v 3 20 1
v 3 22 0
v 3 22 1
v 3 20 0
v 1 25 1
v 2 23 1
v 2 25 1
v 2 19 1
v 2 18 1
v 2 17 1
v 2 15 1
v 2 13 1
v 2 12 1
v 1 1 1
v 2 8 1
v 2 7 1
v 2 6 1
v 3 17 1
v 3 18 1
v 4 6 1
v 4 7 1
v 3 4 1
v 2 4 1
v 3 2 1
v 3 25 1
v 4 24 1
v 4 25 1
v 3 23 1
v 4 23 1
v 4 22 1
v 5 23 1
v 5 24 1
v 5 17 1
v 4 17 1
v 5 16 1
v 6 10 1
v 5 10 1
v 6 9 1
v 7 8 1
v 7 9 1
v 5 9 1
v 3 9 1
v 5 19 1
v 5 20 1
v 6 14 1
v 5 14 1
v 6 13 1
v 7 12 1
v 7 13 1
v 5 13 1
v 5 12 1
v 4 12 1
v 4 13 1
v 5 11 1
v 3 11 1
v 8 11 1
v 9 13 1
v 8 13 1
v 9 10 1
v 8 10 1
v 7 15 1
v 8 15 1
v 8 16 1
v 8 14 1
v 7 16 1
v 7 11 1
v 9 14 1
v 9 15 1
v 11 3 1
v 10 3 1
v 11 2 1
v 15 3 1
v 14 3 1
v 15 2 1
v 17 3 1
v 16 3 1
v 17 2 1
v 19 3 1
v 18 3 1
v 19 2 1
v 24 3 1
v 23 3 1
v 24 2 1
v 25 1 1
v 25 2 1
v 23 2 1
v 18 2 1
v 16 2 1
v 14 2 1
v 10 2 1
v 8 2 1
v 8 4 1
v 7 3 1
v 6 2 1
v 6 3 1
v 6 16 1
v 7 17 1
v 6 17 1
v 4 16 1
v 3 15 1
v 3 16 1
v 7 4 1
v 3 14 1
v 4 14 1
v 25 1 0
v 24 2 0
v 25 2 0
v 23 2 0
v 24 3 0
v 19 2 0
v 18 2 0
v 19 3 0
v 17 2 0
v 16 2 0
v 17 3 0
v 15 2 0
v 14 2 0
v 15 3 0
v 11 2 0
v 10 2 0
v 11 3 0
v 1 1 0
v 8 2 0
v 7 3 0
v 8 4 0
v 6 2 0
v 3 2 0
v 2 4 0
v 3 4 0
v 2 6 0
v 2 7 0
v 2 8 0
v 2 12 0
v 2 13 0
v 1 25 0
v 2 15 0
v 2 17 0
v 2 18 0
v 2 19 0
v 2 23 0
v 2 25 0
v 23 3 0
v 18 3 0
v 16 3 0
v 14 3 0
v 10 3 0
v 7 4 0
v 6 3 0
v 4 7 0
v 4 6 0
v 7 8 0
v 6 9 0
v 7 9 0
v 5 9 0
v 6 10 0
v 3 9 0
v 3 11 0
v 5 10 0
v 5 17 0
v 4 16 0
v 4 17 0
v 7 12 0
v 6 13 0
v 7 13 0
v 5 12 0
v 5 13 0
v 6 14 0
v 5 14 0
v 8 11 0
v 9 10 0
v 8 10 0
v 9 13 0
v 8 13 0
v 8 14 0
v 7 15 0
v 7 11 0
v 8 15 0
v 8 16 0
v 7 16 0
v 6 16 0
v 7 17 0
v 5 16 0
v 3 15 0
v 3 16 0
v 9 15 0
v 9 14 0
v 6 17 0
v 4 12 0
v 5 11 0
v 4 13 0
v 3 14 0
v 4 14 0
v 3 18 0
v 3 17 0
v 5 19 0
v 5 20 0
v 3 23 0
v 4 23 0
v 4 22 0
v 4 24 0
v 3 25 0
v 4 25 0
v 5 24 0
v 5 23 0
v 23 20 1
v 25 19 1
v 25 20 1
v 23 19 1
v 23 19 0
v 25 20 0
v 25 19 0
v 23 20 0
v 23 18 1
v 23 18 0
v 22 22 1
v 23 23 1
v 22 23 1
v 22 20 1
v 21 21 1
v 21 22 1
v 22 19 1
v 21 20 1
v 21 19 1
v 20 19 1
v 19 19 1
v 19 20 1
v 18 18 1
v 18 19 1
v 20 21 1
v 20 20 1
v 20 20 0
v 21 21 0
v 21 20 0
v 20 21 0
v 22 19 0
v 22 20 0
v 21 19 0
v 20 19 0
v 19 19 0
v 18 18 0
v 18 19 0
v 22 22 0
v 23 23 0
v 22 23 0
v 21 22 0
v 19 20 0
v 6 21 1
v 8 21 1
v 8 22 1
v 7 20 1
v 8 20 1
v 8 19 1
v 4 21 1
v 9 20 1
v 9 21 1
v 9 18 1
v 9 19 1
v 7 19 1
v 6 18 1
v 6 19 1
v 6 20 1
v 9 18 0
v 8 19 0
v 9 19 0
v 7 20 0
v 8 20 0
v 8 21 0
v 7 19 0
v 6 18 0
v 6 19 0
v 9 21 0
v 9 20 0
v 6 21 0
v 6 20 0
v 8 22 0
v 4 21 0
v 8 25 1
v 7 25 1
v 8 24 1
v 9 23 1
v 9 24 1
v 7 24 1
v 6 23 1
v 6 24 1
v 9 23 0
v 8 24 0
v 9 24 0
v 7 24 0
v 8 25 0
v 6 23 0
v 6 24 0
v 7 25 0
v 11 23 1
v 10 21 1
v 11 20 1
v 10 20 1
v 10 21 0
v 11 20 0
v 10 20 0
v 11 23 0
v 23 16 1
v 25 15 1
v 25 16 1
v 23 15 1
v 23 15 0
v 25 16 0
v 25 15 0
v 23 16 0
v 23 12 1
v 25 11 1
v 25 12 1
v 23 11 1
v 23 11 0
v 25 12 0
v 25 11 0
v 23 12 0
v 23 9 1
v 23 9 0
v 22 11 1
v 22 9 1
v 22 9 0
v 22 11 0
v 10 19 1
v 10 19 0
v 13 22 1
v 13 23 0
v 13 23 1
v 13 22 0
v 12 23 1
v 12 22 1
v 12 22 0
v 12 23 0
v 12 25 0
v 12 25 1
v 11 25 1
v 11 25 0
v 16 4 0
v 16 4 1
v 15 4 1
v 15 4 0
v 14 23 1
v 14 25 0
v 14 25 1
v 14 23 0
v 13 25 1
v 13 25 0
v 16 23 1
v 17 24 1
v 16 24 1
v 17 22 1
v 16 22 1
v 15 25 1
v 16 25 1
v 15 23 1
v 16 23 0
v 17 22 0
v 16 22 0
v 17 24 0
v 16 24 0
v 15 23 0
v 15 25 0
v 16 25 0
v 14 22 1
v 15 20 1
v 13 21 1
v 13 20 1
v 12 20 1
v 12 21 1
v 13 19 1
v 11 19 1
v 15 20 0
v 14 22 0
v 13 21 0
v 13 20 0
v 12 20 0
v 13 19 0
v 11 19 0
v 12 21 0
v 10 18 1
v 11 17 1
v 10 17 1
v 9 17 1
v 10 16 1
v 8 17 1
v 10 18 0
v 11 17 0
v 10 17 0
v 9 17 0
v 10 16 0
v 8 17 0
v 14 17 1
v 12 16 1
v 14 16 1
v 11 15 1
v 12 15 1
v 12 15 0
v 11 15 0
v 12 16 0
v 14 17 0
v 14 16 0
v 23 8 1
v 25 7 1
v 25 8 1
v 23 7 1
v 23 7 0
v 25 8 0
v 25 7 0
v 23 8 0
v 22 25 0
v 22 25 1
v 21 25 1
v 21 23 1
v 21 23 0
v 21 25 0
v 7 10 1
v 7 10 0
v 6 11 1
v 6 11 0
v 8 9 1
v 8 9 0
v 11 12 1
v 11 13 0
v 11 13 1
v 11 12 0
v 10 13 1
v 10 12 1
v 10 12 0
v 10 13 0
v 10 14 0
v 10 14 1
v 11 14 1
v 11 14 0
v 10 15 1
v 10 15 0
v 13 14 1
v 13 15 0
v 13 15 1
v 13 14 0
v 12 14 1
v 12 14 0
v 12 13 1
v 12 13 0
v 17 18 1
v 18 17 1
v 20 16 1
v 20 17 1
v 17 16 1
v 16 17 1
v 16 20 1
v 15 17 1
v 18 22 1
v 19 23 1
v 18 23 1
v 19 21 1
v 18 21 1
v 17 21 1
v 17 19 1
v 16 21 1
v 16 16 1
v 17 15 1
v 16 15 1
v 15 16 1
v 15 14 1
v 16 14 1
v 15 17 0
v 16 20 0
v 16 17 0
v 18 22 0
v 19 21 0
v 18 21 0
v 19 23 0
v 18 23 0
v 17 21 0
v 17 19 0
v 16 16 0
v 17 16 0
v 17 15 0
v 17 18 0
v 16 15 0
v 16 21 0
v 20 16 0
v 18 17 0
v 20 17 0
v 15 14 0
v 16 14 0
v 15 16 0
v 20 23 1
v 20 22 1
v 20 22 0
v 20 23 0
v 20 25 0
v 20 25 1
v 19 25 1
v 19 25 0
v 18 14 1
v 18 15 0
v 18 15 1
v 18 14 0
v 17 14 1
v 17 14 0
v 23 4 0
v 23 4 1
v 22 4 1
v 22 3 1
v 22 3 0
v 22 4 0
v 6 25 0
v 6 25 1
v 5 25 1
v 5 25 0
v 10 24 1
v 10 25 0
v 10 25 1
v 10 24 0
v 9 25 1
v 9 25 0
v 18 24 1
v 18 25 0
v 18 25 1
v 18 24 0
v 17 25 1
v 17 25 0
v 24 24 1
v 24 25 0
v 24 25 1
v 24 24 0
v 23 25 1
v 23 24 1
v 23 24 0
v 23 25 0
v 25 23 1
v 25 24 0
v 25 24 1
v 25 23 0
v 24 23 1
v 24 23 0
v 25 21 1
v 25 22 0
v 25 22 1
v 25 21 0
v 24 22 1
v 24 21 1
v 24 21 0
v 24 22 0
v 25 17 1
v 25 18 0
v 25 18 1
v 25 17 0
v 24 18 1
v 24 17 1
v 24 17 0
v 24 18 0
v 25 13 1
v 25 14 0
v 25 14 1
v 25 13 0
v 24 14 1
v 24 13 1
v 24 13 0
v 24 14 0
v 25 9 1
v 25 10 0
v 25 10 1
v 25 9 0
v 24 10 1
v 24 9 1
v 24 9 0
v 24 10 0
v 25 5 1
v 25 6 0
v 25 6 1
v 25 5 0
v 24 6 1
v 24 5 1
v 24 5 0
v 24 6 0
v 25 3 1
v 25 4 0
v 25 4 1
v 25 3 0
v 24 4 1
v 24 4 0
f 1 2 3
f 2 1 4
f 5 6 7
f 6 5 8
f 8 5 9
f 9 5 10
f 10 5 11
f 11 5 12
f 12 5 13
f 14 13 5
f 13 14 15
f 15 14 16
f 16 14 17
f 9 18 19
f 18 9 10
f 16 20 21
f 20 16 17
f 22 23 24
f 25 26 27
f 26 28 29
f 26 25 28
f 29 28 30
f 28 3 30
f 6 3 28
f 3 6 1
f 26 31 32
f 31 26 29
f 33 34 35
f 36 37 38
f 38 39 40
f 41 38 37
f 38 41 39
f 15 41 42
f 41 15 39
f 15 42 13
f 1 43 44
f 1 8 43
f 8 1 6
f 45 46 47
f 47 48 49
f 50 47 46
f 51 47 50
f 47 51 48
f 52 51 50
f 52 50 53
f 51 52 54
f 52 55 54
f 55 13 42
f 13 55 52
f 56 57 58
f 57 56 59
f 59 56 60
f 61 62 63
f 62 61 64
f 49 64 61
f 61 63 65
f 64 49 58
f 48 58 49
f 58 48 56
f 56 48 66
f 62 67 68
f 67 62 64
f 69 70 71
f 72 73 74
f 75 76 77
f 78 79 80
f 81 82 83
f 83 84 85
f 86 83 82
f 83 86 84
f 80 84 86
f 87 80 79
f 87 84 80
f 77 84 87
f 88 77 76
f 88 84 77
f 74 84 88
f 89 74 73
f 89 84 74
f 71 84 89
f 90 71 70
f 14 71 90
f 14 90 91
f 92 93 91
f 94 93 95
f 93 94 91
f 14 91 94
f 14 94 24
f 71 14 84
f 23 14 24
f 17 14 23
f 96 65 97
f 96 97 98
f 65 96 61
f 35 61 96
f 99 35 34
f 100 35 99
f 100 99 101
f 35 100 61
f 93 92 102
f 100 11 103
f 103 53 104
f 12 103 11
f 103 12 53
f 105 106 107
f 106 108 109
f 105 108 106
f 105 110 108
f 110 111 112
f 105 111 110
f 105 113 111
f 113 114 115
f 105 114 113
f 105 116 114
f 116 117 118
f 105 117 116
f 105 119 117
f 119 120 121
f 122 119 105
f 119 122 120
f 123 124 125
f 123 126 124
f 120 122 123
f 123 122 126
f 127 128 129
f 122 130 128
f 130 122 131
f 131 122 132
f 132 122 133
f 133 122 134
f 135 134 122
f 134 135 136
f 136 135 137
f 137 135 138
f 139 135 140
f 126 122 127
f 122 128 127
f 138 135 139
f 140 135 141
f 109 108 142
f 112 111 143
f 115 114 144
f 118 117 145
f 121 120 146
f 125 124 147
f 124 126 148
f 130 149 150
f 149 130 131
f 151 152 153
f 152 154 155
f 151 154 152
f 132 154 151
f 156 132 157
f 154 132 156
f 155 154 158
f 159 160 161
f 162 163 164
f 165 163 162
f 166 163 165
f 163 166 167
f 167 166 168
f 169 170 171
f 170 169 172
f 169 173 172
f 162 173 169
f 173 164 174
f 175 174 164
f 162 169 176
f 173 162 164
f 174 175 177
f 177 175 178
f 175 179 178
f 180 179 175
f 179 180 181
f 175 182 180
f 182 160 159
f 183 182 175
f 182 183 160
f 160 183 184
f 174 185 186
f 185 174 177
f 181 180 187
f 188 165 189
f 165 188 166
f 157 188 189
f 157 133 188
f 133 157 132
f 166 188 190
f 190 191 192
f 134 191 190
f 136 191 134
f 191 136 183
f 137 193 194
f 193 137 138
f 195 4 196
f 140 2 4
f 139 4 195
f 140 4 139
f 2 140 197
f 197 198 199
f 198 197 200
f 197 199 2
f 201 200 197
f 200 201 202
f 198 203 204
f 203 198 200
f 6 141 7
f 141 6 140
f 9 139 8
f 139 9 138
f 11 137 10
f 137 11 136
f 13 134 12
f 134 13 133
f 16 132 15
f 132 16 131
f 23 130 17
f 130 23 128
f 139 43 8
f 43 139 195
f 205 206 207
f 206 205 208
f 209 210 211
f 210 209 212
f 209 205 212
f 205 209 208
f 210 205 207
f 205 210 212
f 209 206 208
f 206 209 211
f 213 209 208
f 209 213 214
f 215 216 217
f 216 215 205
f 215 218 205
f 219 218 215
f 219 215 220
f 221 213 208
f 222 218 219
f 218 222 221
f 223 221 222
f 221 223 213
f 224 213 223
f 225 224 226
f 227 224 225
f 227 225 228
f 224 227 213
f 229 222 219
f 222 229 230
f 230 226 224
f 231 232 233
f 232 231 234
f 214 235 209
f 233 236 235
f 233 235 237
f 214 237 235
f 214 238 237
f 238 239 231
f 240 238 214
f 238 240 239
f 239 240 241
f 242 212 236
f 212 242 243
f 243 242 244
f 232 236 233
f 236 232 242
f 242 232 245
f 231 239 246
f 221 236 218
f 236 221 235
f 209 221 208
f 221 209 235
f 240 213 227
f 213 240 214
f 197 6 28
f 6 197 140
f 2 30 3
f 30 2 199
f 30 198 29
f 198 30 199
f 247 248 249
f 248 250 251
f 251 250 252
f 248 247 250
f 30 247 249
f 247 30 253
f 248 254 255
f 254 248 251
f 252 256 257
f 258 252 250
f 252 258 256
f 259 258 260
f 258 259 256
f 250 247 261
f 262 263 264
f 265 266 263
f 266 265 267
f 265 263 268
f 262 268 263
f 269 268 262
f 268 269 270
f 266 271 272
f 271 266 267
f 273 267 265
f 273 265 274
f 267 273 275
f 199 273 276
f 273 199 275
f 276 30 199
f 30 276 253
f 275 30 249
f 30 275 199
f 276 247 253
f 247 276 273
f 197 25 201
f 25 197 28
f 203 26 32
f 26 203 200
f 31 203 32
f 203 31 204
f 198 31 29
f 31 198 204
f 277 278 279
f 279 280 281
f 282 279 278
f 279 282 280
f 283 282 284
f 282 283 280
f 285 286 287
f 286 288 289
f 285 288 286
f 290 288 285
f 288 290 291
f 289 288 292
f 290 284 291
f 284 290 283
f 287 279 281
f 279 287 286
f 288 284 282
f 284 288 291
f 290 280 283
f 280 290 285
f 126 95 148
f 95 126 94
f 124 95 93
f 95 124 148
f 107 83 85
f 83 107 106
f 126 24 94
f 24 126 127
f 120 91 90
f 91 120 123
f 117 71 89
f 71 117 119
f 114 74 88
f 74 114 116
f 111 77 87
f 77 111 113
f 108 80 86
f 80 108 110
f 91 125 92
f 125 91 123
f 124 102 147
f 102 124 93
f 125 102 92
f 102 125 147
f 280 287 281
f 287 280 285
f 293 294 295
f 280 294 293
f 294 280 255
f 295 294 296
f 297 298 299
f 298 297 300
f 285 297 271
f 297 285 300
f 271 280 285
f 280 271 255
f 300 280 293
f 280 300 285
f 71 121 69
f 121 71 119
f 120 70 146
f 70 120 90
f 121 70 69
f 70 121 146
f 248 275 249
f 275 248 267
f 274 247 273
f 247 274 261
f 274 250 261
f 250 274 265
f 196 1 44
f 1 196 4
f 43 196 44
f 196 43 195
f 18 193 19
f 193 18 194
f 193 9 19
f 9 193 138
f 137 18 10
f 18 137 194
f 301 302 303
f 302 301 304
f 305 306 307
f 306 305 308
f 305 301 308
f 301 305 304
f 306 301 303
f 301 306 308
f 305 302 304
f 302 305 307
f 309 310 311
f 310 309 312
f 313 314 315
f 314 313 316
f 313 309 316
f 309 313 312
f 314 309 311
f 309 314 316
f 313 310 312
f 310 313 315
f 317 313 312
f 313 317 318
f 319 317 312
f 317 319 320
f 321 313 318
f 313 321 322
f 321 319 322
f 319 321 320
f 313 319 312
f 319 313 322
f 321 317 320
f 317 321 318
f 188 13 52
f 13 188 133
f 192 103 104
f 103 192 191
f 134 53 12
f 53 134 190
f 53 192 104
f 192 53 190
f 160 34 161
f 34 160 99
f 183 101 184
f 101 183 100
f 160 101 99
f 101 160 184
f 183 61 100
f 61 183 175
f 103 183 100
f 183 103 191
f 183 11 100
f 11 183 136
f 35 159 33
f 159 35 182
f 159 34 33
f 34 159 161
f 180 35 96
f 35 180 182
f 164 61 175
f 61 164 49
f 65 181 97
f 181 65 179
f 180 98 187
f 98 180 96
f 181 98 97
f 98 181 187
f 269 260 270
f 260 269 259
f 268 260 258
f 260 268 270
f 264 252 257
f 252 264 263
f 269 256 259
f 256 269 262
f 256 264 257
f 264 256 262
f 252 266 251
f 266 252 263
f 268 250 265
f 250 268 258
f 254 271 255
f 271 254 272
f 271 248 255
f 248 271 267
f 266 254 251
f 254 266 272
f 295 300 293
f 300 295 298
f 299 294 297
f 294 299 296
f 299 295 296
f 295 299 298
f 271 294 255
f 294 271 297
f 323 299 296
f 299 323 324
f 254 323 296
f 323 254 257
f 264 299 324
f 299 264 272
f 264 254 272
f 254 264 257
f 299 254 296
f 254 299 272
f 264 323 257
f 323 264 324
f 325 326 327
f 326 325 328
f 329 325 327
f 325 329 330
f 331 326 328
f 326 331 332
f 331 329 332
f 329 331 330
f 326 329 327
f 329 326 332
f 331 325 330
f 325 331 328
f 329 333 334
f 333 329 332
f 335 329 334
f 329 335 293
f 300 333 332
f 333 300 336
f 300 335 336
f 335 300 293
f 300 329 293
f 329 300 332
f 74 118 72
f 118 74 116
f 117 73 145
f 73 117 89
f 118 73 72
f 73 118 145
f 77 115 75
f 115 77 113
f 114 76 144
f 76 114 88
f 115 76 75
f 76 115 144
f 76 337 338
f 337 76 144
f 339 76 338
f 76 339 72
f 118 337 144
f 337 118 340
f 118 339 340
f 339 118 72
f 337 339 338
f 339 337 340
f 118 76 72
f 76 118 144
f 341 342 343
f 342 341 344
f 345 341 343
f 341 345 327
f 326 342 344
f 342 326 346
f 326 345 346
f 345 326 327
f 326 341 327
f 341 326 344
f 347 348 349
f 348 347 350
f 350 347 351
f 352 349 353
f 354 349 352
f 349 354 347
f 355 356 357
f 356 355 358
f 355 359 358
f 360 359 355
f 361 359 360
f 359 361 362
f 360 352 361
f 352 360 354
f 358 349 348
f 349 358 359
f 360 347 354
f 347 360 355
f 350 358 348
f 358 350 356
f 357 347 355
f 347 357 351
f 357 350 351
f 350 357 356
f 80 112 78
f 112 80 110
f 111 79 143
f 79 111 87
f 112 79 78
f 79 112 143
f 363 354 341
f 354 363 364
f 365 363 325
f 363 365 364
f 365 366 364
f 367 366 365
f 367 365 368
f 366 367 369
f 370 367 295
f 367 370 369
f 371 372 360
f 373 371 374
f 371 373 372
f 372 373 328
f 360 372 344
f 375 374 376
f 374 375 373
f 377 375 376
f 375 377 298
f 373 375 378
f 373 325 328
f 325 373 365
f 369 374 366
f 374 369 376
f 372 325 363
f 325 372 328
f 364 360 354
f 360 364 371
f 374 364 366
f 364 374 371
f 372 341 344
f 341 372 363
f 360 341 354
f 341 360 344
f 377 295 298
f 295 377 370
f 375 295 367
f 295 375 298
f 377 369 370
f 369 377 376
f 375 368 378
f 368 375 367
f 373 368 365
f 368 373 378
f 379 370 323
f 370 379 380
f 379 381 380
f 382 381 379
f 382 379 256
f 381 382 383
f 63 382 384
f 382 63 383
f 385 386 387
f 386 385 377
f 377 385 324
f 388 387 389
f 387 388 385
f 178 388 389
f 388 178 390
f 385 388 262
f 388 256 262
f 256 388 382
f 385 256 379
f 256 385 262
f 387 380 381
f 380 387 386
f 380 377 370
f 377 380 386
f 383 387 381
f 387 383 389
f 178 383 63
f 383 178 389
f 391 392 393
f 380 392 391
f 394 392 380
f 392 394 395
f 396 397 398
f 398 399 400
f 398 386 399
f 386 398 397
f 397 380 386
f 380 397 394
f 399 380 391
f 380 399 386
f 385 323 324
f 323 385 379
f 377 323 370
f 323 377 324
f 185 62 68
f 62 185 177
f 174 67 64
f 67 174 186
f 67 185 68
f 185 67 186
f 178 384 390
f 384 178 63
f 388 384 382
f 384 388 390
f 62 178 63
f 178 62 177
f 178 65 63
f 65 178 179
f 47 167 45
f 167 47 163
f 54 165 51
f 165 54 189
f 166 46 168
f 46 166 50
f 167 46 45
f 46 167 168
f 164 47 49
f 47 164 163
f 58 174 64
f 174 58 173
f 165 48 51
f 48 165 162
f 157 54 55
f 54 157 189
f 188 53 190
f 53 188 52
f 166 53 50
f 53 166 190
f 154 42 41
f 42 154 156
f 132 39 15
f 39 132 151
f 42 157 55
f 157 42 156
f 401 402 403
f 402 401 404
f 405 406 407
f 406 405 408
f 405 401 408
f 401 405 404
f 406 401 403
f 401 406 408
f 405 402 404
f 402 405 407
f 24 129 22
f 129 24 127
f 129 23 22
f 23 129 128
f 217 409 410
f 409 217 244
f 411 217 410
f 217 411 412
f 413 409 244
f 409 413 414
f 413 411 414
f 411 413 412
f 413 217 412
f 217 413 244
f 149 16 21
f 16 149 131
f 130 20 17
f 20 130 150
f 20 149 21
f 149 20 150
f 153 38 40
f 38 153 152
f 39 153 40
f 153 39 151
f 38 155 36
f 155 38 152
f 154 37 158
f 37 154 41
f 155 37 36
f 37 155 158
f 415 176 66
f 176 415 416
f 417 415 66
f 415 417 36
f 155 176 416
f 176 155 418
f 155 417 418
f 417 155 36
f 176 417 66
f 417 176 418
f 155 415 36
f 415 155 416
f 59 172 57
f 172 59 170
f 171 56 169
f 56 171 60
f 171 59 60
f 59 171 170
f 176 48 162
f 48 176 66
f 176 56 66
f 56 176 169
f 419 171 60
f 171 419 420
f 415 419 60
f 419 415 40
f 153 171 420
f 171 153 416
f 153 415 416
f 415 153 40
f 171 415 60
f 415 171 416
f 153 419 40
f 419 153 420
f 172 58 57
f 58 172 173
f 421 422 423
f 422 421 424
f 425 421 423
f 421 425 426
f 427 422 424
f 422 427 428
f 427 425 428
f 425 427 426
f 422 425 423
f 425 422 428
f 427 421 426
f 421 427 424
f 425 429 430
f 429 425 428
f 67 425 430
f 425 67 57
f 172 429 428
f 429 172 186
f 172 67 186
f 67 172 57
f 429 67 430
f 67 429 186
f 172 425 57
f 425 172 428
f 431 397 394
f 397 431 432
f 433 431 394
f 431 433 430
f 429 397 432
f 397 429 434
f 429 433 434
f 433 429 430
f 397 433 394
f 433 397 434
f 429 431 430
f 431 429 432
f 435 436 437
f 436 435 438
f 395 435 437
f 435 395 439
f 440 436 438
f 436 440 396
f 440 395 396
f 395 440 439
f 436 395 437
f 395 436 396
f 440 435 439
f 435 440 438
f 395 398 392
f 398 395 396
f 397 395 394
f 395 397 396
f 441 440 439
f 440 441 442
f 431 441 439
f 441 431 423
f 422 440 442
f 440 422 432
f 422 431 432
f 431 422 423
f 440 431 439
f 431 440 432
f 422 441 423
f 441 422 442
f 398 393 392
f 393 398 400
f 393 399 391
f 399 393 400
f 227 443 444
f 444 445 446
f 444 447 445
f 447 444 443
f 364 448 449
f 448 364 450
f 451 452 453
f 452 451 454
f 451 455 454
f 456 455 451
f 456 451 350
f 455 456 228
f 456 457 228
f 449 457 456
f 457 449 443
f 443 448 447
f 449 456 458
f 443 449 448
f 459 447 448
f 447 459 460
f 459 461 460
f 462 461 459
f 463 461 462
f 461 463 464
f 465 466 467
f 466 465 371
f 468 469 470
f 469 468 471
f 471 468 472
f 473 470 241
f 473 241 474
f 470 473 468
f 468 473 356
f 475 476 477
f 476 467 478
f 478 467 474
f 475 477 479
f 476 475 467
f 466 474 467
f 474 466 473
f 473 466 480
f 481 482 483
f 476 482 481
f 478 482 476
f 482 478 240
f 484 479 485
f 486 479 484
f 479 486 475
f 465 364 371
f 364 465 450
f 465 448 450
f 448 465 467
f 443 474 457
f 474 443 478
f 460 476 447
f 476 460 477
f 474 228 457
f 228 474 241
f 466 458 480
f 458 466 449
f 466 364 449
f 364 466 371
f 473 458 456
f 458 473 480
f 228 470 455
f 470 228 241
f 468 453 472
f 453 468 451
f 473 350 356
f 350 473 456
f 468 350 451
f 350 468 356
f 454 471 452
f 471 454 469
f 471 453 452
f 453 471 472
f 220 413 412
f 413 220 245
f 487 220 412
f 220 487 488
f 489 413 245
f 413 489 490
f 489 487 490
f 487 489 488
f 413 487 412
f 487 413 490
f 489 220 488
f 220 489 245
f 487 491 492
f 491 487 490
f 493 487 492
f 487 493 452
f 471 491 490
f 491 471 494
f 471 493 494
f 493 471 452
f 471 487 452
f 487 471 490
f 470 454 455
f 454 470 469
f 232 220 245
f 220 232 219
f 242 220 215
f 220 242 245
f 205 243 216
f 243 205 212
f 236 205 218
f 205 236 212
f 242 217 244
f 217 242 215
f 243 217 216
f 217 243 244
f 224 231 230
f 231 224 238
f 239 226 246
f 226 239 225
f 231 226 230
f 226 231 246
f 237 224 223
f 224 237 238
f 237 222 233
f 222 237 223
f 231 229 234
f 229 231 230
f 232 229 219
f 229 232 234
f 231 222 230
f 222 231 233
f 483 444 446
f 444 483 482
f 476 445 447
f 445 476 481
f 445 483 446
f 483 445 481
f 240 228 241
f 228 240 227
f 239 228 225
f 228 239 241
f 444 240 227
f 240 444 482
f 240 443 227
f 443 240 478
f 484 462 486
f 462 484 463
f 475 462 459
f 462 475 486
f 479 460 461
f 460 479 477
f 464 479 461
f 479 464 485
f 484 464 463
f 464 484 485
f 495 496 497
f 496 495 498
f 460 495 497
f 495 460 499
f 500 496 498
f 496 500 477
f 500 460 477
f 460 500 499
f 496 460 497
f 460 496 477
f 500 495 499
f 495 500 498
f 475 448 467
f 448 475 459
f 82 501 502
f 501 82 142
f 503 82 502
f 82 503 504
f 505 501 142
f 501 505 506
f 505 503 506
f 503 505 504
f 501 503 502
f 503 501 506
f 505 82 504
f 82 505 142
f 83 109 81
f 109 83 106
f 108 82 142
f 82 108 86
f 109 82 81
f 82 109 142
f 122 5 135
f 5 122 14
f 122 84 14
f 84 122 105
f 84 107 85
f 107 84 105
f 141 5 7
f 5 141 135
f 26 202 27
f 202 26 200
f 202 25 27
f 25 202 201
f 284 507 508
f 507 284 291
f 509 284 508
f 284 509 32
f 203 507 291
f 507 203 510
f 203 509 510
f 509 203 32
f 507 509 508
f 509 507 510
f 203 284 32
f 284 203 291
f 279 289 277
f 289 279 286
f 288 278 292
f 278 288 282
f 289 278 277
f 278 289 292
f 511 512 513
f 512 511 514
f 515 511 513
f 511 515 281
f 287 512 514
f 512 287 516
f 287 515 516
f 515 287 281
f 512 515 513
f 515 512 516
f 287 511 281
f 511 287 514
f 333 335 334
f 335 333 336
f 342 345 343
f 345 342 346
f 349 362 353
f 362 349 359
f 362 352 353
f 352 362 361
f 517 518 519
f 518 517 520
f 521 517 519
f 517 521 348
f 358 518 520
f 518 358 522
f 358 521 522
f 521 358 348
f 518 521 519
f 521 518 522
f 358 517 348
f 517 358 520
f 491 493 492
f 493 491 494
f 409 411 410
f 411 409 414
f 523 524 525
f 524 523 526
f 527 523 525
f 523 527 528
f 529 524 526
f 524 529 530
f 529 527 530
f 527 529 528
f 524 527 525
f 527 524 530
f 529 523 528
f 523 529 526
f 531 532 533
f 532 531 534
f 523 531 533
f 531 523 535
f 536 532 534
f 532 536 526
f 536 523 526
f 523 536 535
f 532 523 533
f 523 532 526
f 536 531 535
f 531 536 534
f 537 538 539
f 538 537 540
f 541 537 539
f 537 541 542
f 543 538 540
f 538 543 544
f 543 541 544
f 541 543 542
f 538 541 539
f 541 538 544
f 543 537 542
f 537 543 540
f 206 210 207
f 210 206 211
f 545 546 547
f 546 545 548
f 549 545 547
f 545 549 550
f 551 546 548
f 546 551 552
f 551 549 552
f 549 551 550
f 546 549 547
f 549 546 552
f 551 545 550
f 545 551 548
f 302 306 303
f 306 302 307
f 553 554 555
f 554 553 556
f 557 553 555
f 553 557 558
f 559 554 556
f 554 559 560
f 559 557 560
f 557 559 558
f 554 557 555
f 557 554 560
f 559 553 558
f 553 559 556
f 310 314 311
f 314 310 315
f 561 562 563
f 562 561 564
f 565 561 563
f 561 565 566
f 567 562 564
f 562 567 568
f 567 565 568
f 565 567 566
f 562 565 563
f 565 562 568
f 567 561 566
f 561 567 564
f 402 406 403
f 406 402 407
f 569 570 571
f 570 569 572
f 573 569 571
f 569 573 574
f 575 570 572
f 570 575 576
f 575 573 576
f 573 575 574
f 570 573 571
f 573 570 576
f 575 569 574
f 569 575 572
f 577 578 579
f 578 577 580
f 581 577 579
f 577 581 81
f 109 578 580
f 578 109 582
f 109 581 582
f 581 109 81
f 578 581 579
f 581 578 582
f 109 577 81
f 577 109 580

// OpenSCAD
// file: ../../util/bitmap.scad
/*****************************************************************************
 * Module Bitmap Library
 * Modules to create bitmaps of unit squares from 1 or 2 dimensional vectors.
 *****************************************************************************
 * Copyright 2017 Chris Baker
 *
 * This program is free software: you can redistribute it and/or modify
 * it under the terms of the GNU Lesser General Public License as published by
 * the Free Software Foundation, either version 3 of the License, or
 * (at your option) any later version.
 *
 * This program is distributed in the hope that it will be useful,
 * but WITHOUT ANY WARRANTY; without even the implied warranty of
 * MERCHANTABILITY or FITNESS FOR A PARTICULAR PURPOSE.  See the
 * GNU Lesser General Public License for more details.
 *
 * You should have received a copy of the GNU Lesser General Public License
 * along with this program.  If not, see <http://www.gnu.org/licenses/>.
 *****************************************************************************
 * Usage:
 * Include this file with the "use" tag.
 * Depends on compat.scad library.
 *
 * API:
 *   1dbitmap(bitmap, center, expansion, vector_mode)
 *   2dbitmap(bitmap, center, expansion, vector_mode)
 *     Generate a 1 or 2-Dimensional field of modules based on the provided
 *     bitmap vector. See Bitmap Vectors below.
 *     The center flag determines whether to center the bitmap on the origin.
 *     The expansion value actually shrinks each cube in the x and y
 *     dimension by the specified amount.
 *     The vector_mode flag determines whether to create 3D solid geometry
 *     (unit cubes) or 2D vector geometry (squares).
 *
 * Bitmap Vectors:
 *   The bitmap vectors primarily provide boolean information.
 *   A module will be placed where these vectors have a postive value and
 *   skipped where they have a negative value. I.E. 0, -1, false, and undef
 *   are all equivalent and result in a skip. 1 and true are equivalent and
 *   result in a placed 1-unit module.
 *   Further, if the value is an integer it will be treated as a height for
 *   the module, allowing z-maps to be created.
 *   If the value is not an integer or boolean, it will be treated as a color
 *   reference. This can be a string or RGBA vector that will be used to
 *   color the module in the OpenSCAD preview window.
 *   In current versions of OpenSCAD, the color has no effect in the rendered
 *   view or STL output.
 *
 * Vector Mode:
 *   Although OpenSCAD supports generating 2D geometry, there are several
 *   caveats:
 *   - 2D and 3D geometry cannot be mixed
 *   - Extruding 2D geometry causes color information to be lost
 *   - All 2D geometry is projected onto the XY plane when rendering
 *   - Rendering also results in loss of color (same as 3D)
 *   - The SVG exporter is somewhat limited:
 *     - The pixel size of the image is hard-coded in the file
 *     - The title of the image is a generic string
 *     - The color selection for stroke and fill is fixed
 *     - The stroke-width is set to a large value that will cause overlap
 *     - The background is transparent
 *     - Only one path element is created with all of the geometry; there is
 *       no easy way to split up the geometry into multiple logical units.
 *     - These issues can mostly be resolved by hand-editing the file:
 *       - Remove or modify the width and height parameters from the svg
 *         element at the top of the file to provide better scaling.
 *       - Edit the title element at the top of the file to change the title.
 *       - Edit the stroke and fill parameters of the path element (these will
 *         probably be at the end of the file).
 *       - Set the stroke-width parameter for the path element to 0.
 *****************************************************************************/
use <compat.scad>

/*
 * 2dbitmap - Turn a 2D vector into a bitmap of cubes
 *
 * bitmap - 2D vector representing where to place each cube
 *          Value can either be boolean, z-height, or color
 * center - center cubes around the origin
 * expansion - size of gap around each pixel (screendoor)
 * vector_mode - create a 2D vector drawing instead of 3D extrusion
 */
module 2dbitmap(bitmap=[[1,0],[0,1]], center=false, expansion=0, vector_mode=false)
{
	ylen=len(bitmap)-1;

	for (y=[0:ylen]) {
		xlen=len(bitmap[y])-1;
		for (x=[0:xlen])
			translate([x-(center?xlen/2:0),ylen-y-(center?ylen/2:0),0])
				if (is_indexable(bitmap[y][x]))
					color(bitmap[y][x])
						if (vector_mode)
							square([1-expansion,1-expansion], center=center);
						else
							cube([1-expansion,1-expansion,1], center=center);
				else
					if (bitmap[y][x])
						if (vector_mode)
							square([1-expansion,1-expansion], center=center);
						else
							cube([1-expansion,1-expansion,clamp_nonnum(bitmap[y][x])], center=center);
	}
}

module 1dbitmap(bitmap=[1,0,1,0,1], center=false, expansion=0, vector_mode=false)
	2dbitmap([bitmap], center, expansion, vector_mode);

/*
 * Examples
 */

// 1D with z-height
translate([10,0,0]) scale([1,10,1])
	1dbitmap(bitmap=[1,1,0,2,0,0,3], expansion=.1);

// 1D with boolean
translate([-20,0,0]) scale([1,10,1])
	1dbitmap(bitmap=[true,false,true,false,true,true]);

// 2D with z-height
scale([2,2,1])
	2dbitmap(bitmap=[[1,0,2,1],[0,3,3,0],[1,1,0,1]],
		center=true);

// 1D with color
translate([0,-10,0]) scale([1,3,1])
	1dbitmap(bitmap=["red","white","blue",[0,0.3,0,0.5]]);

// 1D with color using 2D-vector-mode
translate([-7,-8,0]) scale([1,2])
	1dbitmap(bitmap=["red",0,"blue",0,"green"], vector_mode=true);
translate([-4.5,-10,0]) scale([1,2])
	1dbitmap(bitmap=["red",0,"blue",0,"green"], vector_mode=true, center=true);
// file: ../../util/bitlib.scad
/*****************************************************************************
 * Bit Manipulation Library
 * Provides some useful bit manipulation functions.
 *****************************************************************************
 * Copyright 2017 Chris Baker
 *
 * This program is free software: you can redistribute it and/or modify
 * it under the terms of the GNU Lesser General Public License as published by
 * the Free Software Foundation, either version 3 of the License, or
 * (at your option) any later version.
 *
 * This program is distributed in the hope that it will be useful,
 * but WITHOUT ANY WARRANTY; without even the implied warranty of
 * MERCHANTABILITY or FITNESS FOR A PARTICULAR PURPOSE.  See the
 * GNU Lesser General Public License for more details.
 *
 * You should have received a copy of the GNU Lesser General Public License
 * along with this program.  If not, see <http://www.gnu.org/licenses/>.
 *****************************************************************************
 * Usage:
 * Include this file with the "use" tag.
 * When run on its own, all echo statements in this
 * library should print "true".
 *
 * API:
 *   bit(v,b)
 *     Return the truth value of the b'th bit of v.
 *
 *   check_bit_size(v,b,signed=false)
 *     Determine whether the value v can be represented
 *     with b bits (b must be positive).
 *     The signed flag indicates whether to include the
 *     sign bit in the determination; otherwise negative
 *     values will result in undef being returned.
 *
 *   xor(a,b)
 *     Return the value of a xor b.
 *     Handles arbitrary size values for a and b.
 *     Handles negative values as expected (a positive
 *     result will be returned unless a and b have
 *     differing signs).
 *
 * TODO:
 *  - Change echos to asserts (future OpenSCAD version)
 *  - Add more functions
 *
 *****************************************************************************/

//Return the truth value of the b'th bit of v
function bit(v,b) =
	((v==undef)||(b==undef)||(b<0))?undef:
	(floor(v / pow(2, b)) % 2)?true:false;

echo("*** bit() testcases ***");
echo(0,bit(0,0)==false);
echo(1,bit(-1,0)==true);
echo(2,bit(1,0)==true);
echo(3,[for (i=[0:63]) bit(0,i)]==[for (i=[0:63]) false]); //0=0...0
echo(4,[for (i=[0:63]) bit(-1,i)]==[for (i=[0:63]) true]); //-1=1...1
echo(5,[for (i=[1:63]) bit(1,i)]==[for (i=[1:63]) false]); //1=0...01
echo(6,[for (i=[0:7]) bit(85,i)?1:0]==[1,0,1,0,1,0,1,0]); //85=01010101
echo(7,[for (i=[0:7]) bit(170,i)?1:0]==[0,1,0,1,0,1,0,1]); //170=10101010
echo(8,[for (i=[0:7]) bit(165,i)?1:0]==[1,0,1,0,0,1,0,1]); //165=10100101
echo(9,[for (i=[0:7]) bit(56,i)?1:0]==[0,0,0,1,1,1,0,0]); //56=00111000
echo(10,[for (i=[0:7]) bit(-3,i)?1:0]==[1,0,1,1,1,1,1,1]); //-3=1...101
//(2^64)=0...01 0...0
echo(11,bit(pow(2,64),64)==true);
echo(12,[for (i=[0:63]) bit(pow(2,64),i)]==[for (i=[0:63]) false]);
echo(13,[for (i=[65:127]) bit(pow(2,64),i)]==[for (i=[1:63]) false]);
//-(2^64)=1...1 0...0
echo(14,[for (i=[0:63]) bit(-pow(2,64),i)]==[for (i=[0:63]) false]);
echo(15,[for (i=[64:127]) bit(-pow(2,64),i)]==[for (i=[0:63]) true]);
echo(16,bit(10,-1)==undef);
echo(17,bit(10,undef)==undef);
echo(18,bit(undef,3)==undef);

//return true if v can be represented in b bits
//if signed flag is set. the result will be adjusted
//to account for the needed sign bit
function check_bit_size(v,b,signed=false) =
	(b<0)?undef:
	(v==undef)?undef:
	(b==0)?false:
	(v==0)?true: //(b>0)
	(signed)?
		(v<0)?(-pow(2,b-1)<(v+1)):
			(pow(2,b-1)>(v+1)):
		(v<0)?undef:
			(pow(2,b)>v);

echo("*** check_bit_size() testcases ***");
echo(0,check_bit_size(-1,2)==undef);
echo(1,check_bit_size(2,-4)==undef);
echo(2,check_bit_size(2,-4,signed=true)==undef);
echo(3,check_bit_size(0,0)==false);
echo(4,check_bit_size(0,1)==true);
echo(5,check_bit_size(1,0)==false);
echo(6,check_bit_size(1,1)==true);
echo(7,check_bit_size(7,3)==true);
echo(8,check_bit_size(8,3)==false);
echo(9,check_bit_size(1,3)==true);
echo(10,check_bit_size(256,8)==false);
echo(11,check_bit_size(255,8)==true);
echo(12,check_bit_size(10,2)==false);
echo(13,check_bit_size(10,4)==true);
echo(14,check_bit_size(-10,2,signed=true)==false);
echo(15,check_bit_size(-10,4,signed=true)==false);
echo(16,check_bit_size(-10,5,signed=true)==true);
echo(17,check_bit_size(-1,0,signed=true)==false);
echo(18,check_bit_size(-1,1,signed=true)==true);
echo(19,check_bit_size(0,0,signed=true)==false);
echo(20,check_bit_size(0,1,signed=true)==true);
echo(21,check_bit_size(-2,2,signed=true)==true);
echo(22,check_bit_size(-3,2,signed=true)==false);
echo(23,check_bit_size(-3,3,signed=true)==true);
echo(24,check_bit_size(-8,3,signed=true)==false);
echo(25,check_bit_size(-8,4,signed=true)==true);
echo(26,check_bit_size(undef,4)==undef);
echo(27,check_bit_size(undef,4,signed=true)==undef);

//return the value of a xor b
//runs recursively until all bits of a and b are exhausted
function xor(a,b,i=0) =
	((a==undef)||(b==undef))?undef:
	let (c=bit(a,i), d=bit(b,i),
		 v=((c||d) && !(c&&d))?pow(2,i):0)
		(check_bit_size(a,i,signed=true) &&
		 check_bit_size(b,i,signed=true))?
			-v: //special case for sign bit
			v+xor(a,b,i+1); //recursively add powers of 2

echo("*** xor() testcases ***");
echo(0,xor(42,0)==42);
echo(1,xor(42,42)==0);
echo(2,xor(169,238)==71); //10101001^11101110=01000111=71
echo(3,xor(238,169)==71);
echo(4,xor(42,238)==196); //00101010^11101110=11000100=196
echo(5,xor(169,42)==131); //10101001^00101010=10000011=131
echo(6,xor(-8,-10)==14); //11000^10110=01110=14
echo(7,xor(-7,-10)==15); //11001^10110=01111=15
echo(8,xor(9,-10)==-1); //01001^10110=11111=-1
echo(9,xor(9,-12)==-3); //01001^10100=11101=-3
echo(10,xor(undef,0)==undef);
// file: ../../util/stringlib.scad
/*****************************************************************************
 * String Manipulation Library
 * Provides some useful string manipulation functions.
 *****************************************************************************
 * Copyright 2017 Chris Baker
 *
 * This program is free software: you can redistribute it and/or modify
 * it under the terms of the GNU Lesser General Public License as published by
 * the Free Software Foundation, either version 3 of the License, or
 * (at your option) any later version.
 *
 * This program is distributed in the hope that it will be useful,
 * but WITHOUT ANY WARRANTY; without even the implied warranty of
 * MERCHANTABILITY or FITNESS FOR A PARTICULAR PURPOSE.  See the
 * GNU Lesser General Public License for more details.
 *
 * You should have received a copy of the GNU Lesser General Public License
 * along with this program.  If not, see <http://www.gnu.org/licenses/>.
 *****************************************************************************
 * Usage:
 * Include this file with the "use" tag.
 * When run on its own, all echo statements in this library should print
 * "true".
 *
 * API:
 *   atoi(a)
 *     Convert the string of numerals, a, to a vector of individual decimal
 *     numbers.
 *
 *   ascii_to_vec(a)
 *     Convert the ASCII string, a, into a vector of decimal numbers.
 *
 * TODO:
 *  - Change echos to asserts (future OpenSCAD version)
 *
 *****************************************************************************/

/*
 * atoi - convert ASCII numerals to a vector of individual decimal numbers
 *
 * a - the ASCII string of numerals
 */
function atoi(a) = (len(a)==undef)?undef:
[
	let (val = search(a, "0123456789"))
		for (i = val) i
];

echo("*** atoi() testcases ***");
echo(ascii_to_vec(undef)==undef);
echo(ascii_to_vec(true)==undef);
echo(ascii_to_vec(false)==undef);
echo(ascii_to_vec("")==[]);
echo(atoi("0")==[0]);
echo(atoi("1")==[1]);
echo(atoi("2")==[2]);
echo(atoi("3")==[3]);
echo(atoi("4")==[4]);
echo(atoi("5")==[5]);
echo(atoi("6")==[6]);
echo(atoi("7")==[7]);
echo(atoi("8")==[8]);
echo(atoi("9")==[9]);
echo(atoi("123")==[1,2,3]);
echo(atoi("1a23b")==[1,2,3]); //degenerate case, don't really care too much about the result

/*
 * ascii_to_vec - convert ASCII string to decimal vector
 *
 * a - the ASCII string to vectorize
 */
function ascii_to_vec(a) = (len(a)==undef)?undef:
[
	let (val = search(a, "\x01\x02\x03\x04\x05\x06\x07\x08\x09\x0a\x0b\x0c\x0d\x0e\x0f\x10\x11\x12\x13\x14\x15\x16\x17\x18\x19\x1a\x1b\x1c\x1d\x1e\x1f !\"#$%&'()*+,-./0123456789:;<=>?@ABCDEFGHIJKLMNOPQRSTUVWXYZ[\\]^_`abcdefghijklmnopqrstuvwxyz{|}~\x7f"))
		for (i = val) i+1
];

echo("*** ascii_to_vec() testcases ***");
echo(ascii_to_vec(undef)==undef);
echo(ascii_to_vec(true)==undef);
echo(ascii_to_vec(false)==undef);
echo(ascii_to_vec("")==[]);
echo(ascii_to_vec("0")==[48]);
echo(ascii_to_vec("a")==[97]);
echo(ascii_to_vec("0123456789")==[48,49,50,51,52,53,54,55,56,57]);
echo(ascii_to_vec("The quick brown fox jumped over the lazy dog.")
	==[84,104,101,32,113,117,105,99,107,32,98,114,111,119,110,32,102,111,120,32,106,117,109,112,101,100,32,111,118,101,114,32,116,104,101,32,108,97,122,121,32,100,111,103,46]);
// main file
/* Unit Test 12: 24x24 - 36 data bytes, 24 ecc bytes */
use <../datamatrix.scad>
data_matrix(dm_ascii("http://de.wikiquote.org/wiki/Zukunft"), mark="black");
